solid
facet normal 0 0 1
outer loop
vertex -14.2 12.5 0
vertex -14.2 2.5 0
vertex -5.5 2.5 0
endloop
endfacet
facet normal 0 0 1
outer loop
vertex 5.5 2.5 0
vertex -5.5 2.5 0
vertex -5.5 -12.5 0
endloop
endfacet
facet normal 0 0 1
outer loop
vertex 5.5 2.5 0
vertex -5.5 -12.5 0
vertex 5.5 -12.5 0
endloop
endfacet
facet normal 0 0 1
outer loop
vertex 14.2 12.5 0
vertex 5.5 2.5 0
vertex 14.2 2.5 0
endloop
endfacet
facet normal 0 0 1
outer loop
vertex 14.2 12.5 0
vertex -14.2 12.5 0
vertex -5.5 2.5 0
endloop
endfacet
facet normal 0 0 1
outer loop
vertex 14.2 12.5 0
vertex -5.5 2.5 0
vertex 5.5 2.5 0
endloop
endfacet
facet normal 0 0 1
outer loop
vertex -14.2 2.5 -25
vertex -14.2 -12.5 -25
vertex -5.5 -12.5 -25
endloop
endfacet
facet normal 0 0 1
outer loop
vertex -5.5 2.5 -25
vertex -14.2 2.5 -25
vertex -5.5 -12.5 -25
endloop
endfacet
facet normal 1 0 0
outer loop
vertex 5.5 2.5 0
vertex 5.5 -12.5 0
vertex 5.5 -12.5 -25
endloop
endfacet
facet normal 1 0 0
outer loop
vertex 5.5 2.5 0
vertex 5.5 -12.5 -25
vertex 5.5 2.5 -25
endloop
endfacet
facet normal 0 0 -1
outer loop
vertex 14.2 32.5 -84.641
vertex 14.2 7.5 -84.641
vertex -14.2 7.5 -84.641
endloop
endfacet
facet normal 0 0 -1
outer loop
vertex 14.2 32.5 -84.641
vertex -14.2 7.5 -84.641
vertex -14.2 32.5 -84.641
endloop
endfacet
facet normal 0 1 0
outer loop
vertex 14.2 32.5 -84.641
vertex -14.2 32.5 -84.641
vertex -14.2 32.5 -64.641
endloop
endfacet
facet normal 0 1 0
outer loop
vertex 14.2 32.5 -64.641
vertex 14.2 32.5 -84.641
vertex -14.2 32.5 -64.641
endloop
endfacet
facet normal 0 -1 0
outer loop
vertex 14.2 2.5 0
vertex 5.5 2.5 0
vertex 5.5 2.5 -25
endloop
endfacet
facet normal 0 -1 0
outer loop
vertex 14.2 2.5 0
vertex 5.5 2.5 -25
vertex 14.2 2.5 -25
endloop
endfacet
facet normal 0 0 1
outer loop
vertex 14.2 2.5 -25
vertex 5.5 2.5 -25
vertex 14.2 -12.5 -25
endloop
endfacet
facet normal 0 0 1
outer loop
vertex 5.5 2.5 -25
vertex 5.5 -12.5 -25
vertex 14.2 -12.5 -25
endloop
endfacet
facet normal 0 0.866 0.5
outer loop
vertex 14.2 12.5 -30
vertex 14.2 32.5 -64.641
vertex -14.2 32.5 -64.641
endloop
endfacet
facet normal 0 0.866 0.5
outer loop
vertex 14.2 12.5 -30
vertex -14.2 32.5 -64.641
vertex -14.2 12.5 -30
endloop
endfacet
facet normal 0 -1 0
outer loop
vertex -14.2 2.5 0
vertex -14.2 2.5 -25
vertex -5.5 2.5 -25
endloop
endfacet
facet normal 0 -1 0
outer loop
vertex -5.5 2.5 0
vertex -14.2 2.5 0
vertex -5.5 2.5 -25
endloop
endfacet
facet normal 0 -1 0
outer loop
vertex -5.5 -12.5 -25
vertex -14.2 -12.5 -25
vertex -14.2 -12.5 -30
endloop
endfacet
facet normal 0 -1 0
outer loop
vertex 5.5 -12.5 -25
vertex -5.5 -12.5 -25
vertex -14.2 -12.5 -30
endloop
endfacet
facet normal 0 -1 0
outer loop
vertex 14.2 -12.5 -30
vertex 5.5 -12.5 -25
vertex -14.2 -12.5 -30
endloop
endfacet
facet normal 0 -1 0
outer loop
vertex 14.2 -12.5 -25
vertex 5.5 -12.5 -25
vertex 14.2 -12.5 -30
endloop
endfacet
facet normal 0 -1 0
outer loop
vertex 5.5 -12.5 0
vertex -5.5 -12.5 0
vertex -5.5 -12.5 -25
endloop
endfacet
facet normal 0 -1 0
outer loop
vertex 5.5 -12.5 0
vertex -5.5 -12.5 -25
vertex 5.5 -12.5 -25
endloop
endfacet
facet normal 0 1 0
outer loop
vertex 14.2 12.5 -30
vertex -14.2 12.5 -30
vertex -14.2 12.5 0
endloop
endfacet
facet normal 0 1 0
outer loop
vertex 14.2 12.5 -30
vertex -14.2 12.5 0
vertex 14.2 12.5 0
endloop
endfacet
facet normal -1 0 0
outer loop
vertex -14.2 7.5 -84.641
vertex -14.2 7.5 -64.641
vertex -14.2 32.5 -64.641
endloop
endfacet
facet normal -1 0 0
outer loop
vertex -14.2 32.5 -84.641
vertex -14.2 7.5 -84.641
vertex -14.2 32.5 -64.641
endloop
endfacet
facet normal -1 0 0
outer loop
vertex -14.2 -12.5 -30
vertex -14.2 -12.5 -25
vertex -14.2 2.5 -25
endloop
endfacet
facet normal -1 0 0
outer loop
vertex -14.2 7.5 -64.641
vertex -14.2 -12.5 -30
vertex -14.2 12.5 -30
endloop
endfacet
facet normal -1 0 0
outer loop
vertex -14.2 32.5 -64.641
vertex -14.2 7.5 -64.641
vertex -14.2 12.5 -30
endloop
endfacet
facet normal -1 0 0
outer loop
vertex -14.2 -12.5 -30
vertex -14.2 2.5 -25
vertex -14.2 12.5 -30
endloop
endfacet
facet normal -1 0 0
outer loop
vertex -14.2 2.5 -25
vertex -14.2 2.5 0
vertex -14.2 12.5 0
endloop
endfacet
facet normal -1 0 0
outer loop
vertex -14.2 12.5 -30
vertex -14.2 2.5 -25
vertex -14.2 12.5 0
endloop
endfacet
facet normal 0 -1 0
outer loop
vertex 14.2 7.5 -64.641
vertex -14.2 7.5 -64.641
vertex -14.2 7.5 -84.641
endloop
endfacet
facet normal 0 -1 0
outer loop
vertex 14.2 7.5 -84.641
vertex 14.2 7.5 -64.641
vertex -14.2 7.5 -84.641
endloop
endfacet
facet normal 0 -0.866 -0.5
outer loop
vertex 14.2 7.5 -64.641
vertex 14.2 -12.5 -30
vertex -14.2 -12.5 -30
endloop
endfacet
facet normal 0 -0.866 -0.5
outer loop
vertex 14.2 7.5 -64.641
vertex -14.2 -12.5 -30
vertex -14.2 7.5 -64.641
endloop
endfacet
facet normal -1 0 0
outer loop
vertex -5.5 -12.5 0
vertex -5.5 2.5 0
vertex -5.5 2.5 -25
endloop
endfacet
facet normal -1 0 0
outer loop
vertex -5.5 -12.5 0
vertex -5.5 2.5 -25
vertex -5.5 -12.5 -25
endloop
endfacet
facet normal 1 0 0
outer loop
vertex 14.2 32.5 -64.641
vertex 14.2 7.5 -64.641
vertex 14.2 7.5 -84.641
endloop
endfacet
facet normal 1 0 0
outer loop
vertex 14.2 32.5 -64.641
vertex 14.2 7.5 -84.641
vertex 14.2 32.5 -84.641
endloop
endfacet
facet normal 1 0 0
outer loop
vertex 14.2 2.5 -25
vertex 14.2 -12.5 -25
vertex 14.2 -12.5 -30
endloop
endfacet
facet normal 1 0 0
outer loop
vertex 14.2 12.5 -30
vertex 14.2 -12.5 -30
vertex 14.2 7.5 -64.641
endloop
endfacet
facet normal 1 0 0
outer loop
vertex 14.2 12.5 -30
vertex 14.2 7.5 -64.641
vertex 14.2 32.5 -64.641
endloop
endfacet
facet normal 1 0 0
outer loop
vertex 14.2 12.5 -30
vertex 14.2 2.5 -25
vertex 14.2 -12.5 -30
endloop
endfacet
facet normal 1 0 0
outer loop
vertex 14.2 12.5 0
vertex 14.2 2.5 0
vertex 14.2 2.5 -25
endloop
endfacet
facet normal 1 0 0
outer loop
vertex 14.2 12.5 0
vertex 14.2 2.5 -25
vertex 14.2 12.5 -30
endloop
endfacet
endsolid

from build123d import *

# Parameters (mm, degrees)
F1_DEPTH = 25
F2_W     = 28.4
F2_H     = 25
F3_DEPTH = 5
F5_DEPTH = 28.4


with BuildPart() as f1:
    # F0 (on Top) → F1 (new body)
    with BuildSketch(Plane.XY):
        Polygon((-5.5, 2.5), (-5.5, -12.5), (5.5, -12.5), (5.5, 2.5), (14.2, 2.5), (14.2, 12.5), (-14.2, 12.5), (-14.2, 2.5), align=None)
    extrude(amount=-F1_DEPTH)

    # F2 (on face) → F3 (join)
    with BuildSketch(Plane(origin=(0, 0, -25), x_dir=(1, 0, 0), z_dir=(0, 0, -1))):
        Rectangle(F2_W, F2_H)
    extrude(amount=F3_DEPTH)

    # F4 (on face) → F5 (join)
    with BuildSketch(Plane.YZ.offset(14.2)):
        Polygon((32.5, -64.6410161514), (12.5, -30), (-12.5, -30), (7.5, -64.6410161514), (7.5, -84.6410161514), (32.5, -84.6410161514), align=None)
    extrude(amount=-F5_DEPTH)


solid = f1.part
